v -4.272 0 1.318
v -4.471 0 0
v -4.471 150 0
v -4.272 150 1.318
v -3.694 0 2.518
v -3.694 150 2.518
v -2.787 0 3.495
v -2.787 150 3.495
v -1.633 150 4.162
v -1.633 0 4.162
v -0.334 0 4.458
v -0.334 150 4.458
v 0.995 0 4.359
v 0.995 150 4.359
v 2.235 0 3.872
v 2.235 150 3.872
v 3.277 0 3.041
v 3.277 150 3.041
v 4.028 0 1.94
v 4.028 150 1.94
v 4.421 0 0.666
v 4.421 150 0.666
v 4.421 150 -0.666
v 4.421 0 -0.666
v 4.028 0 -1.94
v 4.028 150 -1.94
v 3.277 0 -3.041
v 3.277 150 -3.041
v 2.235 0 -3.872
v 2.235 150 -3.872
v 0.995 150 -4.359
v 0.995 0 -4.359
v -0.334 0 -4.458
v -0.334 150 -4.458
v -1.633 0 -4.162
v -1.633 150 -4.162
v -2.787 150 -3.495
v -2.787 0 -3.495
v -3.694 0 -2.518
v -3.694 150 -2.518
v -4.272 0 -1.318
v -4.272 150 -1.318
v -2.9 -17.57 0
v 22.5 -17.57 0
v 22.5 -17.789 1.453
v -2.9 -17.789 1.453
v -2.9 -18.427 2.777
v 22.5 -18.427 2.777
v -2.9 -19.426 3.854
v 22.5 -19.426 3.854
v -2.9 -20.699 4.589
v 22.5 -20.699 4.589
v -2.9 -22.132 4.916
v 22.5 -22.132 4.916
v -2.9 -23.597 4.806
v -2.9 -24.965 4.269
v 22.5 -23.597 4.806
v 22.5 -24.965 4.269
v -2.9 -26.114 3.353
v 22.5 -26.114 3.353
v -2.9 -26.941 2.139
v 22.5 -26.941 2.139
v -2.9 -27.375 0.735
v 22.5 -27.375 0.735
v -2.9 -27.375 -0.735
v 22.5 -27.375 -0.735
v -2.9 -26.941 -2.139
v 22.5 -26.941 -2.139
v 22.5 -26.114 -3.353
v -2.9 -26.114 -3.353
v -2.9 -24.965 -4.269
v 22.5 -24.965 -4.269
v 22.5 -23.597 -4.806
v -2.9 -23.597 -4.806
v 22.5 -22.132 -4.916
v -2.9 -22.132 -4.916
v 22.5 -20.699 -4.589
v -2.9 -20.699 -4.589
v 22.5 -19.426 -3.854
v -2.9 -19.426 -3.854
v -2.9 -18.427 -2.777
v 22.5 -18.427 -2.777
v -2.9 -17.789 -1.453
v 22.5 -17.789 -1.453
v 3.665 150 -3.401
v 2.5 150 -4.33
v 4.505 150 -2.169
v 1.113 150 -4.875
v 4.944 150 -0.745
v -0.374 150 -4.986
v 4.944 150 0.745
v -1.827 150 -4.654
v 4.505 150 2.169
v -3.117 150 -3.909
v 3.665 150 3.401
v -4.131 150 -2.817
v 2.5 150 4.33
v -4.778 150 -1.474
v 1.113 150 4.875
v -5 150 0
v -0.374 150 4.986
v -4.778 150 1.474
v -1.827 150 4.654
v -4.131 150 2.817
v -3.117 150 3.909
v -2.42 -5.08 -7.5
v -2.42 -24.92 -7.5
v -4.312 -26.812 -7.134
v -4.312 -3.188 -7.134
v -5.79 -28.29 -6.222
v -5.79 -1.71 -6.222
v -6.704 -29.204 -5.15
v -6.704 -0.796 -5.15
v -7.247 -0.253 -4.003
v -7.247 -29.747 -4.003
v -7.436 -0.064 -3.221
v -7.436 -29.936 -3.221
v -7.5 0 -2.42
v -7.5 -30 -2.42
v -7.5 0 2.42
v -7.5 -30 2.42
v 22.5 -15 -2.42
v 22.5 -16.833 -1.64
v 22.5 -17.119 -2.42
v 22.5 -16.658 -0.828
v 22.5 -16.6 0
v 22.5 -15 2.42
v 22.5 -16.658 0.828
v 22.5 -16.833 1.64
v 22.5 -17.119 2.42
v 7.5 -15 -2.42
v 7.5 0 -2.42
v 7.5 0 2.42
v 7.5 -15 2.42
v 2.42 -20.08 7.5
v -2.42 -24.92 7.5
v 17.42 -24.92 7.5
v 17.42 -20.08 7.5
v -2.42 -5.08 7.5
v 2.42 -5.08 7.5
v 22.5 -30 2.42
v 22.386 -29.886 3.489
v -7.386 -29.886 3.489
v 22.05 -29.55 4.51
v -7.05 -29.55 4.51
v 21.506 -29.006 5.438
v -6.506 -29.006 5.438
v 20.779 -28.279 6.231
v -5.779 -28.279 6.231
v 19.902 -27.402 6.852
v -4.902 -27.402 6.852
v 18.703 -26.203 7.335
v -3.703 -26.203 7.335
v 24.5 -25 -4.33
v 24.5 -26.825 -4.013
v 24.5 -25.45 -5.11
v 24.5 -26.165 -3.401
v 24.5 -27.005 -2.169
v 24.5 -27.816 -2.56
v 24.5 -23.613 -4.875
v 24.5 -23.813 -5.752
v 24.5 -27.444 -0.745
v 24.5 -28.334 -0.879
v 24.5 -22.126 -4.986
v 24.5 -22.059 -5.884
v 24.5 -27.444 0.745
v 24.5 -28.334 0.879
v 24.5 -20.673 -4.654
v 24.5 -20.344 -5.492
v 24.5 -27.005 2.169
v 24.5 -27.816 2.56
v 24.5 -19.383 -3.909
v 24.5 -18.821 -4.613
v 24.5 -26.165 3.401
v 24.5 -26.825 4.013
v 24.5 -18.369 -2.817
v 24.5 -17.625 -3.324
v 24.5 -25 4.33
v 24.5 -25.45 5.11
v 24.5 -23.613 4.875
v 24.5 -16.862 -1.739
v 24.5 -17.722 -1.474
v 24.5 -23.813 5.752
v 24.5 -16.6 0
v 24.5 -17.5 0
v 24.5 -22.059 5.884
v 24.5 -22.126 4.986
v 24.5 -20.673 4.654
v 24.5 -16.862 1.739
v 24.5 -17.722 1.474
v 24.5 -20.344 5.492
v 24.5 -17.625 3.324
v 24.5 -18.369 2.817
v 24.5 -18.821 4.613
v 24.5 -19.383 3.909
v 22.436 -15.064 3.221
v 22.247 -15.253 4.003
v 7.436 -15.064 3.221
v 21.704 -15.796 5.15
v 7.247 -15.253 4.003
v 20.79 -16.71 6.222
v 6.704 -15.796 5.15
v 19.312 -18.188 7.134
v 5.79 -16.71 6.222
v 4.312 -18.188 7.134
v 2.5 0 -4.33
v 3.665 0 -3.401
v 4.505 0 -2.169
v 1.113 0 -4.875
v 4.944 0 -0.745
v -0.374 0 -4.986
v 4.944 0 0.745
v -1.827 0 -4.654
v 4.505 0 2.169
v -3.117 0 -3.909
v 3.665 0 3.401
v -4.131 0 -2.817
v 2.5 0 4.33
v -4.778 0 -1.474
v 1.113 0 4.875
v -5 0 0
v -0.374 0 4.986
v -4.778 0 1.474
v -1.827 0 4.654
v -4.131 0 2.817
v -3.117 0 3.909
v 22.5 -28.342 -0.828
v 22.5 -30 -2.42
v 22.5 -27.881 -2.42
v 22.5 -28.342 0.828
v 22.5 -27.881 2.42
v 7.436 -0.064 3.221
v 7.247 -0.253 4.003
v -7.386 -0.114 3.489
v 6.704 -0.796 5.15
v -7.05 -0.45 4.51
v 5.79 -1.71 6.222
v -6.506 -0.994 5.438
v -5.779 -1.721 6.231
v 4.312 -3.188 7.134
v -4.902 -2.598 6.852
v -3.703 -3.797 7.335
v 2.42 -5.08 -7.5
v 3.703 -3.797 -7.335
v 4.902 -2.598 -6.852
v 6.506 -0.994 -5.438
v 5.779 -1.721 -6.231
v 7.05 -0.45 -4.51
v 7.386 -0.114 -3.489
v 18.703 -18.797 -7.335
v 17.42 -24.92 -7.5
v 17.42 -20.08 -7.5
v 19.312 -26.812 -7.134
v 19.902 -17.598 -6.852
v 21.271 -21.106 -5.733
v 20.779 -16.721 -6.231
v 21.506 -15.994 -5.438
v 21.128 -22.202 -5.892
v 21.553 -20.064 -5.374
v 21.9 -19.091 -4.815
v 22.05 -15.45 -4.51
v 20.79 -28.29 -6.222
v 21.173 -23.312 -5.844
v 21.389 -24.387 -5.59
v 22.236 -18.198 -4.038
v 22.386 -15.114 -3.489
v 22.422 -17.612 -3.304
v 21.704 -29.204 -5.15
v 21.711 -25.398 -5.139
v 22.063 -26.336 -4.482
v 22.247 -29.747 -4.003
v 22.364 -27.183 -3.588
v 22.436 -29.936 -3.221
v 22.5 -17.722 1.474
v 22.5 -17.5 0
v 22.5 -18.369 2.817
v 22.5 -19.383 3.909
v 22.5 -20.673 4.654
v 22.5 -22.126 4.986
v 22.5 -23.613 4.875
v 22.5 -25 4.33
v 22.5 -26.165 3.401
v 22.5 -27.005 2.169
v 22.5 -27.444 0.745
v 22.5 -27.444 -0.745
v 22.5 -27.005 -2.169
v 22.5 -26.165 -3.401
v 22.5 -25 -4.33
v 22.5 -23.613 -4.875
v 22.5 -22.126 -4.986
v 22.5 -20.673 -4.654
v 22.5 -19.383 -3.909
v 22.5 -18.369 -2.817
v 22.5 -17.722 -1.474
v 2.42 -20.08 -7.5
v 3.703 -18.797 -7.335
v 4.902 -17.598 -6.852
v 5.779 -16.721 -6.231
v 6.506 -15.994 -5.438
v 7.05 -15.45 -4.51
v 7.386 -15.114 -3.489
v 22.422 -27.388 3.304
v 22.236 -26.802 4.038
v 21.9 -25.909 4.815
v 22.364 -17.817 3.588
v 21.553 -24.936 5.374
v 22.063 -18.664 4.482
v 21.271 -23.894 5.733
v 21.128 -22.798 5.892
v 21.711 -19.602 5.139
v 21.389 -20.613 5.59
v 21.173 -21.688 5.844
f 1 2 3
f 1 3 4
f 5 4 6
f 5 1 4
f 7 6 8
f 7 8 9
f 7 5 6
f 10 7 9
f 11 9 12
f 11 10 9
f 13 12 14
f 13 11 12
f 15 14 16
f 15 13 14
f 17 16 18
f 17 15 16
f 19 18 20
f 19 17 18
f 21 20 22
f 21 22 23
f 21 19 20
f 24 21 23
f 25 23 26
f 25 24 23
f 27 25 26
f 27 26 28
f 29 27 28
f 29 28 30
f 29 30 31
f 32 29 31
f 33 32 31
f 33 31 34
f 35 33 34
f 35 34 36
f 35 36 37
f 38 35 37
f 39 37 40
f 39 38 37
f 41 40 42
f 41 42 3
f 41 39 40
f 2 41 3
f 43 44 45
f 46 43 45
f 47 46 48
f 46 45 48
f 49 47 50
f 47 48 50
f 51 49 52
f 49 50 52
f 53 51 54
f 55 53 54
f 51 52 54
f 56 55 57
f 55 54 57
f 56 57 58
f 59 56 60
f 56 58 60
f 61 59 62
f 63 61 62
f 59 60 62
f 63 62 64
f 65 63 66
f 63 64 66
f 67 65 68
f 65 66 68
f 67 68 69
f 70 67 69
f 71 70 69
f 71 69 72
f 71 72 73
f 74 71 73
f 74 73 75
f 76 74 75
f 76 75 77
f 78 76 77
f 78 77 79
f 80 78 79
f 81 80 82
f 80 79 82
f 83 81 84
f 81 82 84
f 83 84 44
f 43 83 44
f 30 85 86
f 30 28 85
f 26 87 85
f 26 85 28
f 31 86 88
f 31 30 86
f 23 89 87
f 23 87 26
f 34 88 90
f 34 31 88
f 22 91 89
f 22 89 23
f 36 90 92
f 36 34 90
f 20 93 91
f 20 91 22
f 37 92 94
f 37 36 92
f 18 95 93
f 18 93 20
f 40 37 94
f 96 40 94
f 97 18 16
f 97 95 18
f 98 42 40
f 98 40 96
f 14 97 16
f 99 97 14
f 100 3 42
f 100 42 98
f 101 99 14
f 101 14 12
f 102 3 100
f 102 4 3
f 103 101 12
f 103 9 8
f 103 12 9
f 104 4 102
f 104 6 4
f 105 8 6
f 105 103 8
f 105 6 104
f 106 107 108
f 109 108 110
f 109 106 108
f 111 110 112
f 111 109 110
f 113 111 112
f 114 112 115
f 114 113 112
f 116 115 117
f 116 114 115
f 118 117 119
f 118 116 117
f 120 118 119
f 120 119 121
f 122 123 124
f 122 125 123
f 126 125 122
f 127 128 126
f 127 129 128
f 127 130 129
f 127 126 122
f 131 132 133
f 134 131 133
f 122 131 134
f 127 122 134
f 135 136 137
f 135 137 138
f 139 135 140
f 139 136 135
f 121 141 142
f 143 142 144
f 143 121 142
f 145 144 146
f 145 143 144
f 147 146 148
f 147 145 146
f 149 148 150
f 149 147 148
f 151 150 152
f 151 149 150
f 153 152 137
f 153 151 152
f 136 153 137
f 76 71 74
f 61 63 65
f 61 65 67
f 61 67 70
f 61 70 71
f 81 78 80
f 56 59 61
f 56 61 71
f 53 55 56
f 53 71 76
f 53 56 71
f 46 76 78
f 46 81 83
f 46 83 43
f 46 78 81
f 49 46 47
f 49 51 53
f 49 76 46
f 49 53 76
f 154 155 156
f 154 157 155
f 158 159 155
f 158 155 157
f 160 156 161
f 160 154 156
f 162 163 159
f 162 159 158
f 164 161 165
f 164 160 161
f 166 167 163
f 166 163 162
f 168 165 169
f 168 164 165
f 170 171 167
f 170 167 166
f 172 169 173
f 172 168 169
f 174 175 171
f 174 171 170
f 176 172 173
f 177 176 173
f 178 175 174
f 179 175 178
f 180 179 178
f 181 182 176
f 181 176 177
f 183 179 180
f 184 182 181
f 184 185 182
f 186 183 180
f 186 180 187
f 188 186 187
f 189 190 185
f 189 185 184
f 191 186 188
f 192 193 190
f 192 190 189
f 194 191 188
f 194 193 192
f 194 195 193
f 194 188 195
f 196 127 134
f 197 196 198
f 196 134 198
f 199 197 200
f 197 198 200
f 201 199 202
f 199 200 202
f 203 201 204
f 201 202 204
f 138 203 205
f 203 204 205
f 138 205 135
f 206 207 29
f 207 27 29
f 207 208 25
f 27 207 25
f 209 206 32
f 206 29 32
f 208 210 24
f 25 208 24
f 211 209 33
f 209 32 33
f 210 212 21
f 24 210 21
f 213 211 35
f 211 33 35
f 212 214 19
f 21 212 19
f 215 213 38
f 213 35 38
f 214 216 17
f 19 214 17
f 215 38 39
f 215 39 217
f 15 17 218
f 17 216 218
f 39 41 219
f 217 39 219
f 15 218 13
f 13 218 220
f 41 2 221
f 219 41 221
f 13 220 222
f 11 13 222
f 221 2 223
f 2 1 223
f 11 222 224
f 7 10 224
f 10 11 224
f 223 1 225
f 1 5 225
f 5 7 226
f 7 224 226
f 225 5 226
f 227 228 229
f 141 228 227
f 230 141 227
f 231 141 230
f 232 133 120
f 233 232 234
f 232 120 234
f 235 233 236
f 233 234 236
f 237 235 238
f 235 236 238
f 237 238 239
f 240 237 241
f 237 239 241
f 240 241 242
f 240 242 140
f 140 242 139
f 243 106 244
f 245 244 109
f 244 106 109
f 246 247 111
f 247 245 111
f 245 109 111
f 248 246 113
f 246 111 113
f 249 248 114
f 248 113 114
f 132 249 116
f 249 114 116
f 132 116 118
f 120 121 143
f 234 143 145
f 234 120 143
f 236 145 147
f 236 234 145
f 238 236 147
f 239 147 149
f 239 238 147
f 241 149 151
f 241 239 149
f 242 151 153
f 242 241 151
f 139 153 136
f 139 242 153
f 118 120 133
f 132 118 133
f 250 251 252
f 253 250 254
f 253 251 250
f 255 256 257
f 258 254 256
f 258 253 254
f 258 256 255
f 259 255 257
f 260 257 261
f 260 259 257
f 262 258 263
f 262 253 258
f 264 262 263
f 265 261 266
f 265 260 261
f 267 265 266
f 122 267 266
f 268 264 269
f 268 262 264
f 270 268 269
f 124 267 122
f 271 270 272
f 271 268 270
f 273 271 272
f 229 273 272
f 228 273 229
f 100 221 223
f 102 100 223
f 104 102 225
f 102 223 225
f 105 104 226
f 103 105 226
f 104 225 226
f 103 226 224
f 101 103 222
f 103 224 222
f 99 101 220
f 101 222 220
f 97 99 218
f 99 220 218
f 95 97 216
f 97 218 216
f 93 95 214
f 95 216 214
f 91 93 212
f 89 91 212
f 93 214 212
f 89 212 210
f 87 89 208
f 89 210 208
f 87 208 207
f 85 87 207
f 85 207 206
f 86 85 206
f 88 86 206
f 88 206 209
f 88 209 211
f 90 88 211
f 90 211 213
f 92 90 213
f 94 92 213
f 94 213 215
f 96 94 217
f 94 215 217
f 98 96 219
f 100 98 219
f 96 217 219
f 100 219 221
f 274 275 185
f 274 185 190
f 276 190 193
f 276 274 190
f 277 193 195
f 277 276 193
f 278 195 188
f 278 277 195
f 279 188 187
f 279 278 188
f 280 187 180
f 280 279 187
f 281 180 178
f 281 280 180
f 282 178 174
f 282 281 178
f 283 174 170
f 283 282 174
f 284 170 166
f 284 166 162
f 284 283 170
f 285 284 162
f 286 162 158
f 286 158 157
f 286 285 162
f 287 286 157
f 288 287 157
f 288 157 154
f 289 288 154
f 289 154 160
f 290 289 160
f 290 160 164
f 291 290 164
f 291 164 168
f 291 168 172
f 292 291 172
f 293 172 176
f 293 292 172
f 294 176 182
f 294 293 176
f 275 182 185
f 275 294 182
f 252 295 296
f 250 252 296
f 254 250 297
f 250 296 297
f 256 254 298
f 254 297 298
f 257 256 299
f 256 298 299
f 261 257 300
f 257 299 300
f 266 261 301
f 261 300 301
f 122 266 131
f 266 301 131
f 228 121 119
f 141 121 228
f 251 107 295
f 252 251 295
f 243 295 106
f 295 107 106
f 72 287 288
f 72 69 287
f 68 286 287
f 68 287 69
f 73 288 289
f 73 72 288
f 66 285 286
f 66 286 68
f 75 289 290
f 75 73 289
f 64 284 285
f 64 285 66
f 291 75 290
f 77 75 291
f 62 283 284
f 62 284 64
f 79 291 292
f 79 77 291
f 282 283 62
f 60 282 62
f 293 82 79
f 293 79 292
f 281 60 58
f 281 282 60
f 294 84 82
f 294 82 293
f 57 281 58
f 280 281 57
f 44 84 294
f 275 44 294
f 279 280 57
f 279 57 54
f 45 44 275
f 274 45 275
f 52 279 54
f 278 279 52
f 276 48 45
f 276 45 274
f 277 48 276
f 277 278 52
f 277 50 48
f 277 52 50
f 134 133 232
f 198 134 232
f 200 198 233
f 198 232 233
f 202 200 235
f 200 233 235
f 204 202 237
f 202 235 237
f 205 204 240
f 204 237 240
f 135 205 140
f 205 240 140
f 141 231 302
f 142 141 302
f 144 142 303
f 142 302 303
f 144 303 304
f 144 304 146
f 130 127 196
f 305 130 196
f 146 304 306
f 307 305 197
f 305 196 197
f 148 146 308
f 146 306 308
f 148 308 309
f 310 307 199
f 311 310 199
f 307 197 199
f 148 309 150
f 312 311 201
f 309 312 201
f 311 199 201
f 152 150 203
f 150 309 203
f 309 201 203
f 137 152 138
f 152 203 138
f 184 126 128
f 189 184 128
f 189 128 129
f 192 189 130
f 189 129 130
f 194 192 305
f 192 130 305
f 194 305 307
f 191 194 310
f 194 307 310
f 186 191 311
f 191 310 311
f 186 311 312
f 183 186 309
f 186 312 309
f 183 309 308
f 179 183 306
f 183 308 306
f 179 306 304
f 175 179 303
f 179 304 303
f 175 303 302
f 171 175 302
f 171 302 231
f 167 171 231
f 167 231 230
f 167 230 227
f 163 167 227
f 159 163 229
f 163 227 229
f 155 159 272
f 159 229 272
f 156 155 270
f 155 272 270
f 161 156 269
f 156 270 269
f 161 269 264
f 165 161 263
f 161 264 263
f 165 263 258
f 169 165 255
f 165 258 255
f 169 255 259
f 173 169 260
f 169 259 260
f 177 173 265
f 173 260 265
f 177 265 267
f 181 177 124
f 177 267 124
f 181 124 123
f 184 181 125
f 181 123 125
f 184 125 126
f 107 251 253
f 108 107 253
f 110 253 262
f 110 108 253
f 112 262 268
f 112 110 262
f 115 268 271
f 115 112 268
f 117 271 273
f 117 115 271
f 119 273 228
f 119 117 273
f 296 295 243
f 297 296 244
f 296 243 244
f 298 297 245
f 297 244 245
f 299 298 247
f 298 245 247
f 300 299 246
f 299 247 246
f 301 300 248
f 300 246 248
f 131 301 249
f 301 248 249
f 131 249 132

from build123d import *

# Parameters (mm, degrees)
F0_W          = 15
F0_H          = 15
F0_W_2        = 10
F0_H_2        = 10
F1_DEPTH      = 30
F2_W          = 15
F2_H          = 15
F2_W_2        = 10
F2_H_2        = 10
F4_DEPTH      = 15
F3_W          = 10
F3_H          = 10
F5_DEPTH      = 30
F6_R          = 5
F6_R_2        = 4.4707642424
F7_DEPTH      = 150
F8_W          = 10
F8_H          = 10
F9_DEPTH      = 15
F10_R         = 5.9
F10_R_2       = 5
F11_DEPTH     = 2
F12_R         = 4.929647133
F13_DEPTH     = 25.4
F14_T1_DEPTH  = 27.7
F14_T3_DEPTH  = 27.7
F14_T5_DEPTH  = 55.4
F14_T7_DEPTH  = 55.4
F14_T9_DEPTH  = 40.4
F14_T14_DEPTH = 40.4
F14_S15_R     = 5.9
F14_T16_DEPTH = 22
F14_T20_DEPTH = 40.4
F14_S21_R     = 5.9
F14_T22_DEPTH = 22
F14_T27_DEPTH = 27.7
F14_T31_DEPTH = 27.7
F14_S33_R     = 4.929647133
F14_T34_DEPTH = 16
F14_T40_DEPTH = 27.7
F14_T44_DEPTH = 27.7
F14_S46_R     = 4.929647133
F14_T47_DEPTH = 16


# Not quite as in the source:
# - a fillet or chamfer that OpenCascade refuses, or shapes differently, is made with other operations: its cross-section is extruded or revolved along the edge and cut away or added


with BuildPart() as f1:
    # F0 (on Front) → F1 (new body)
    with BuildSketch(Plane.XZ):
        Rectangle(F0_W, F0_H)
        Rectangle(F0_W_2, F0_H_2, mode=Mode.SUBTRACT)
    extrude(amount=F1_DEPTH)

    # F2 (on face) → F4 (join)
    with BuildSketch(Plane.YZ.offset(7.5)):
        with Locations((-22.5, 0)):
            Rectangle(F2_W, F2_H)
        with Locations((-22.5, 0)):
            Rectangle(F2_W_2, F2_H_2, mode=Mode.SUBTRACT)
    extrude(amount=F4_DEPTH)

    # F3 (on face) → F5 (join)
    with BuildSketch(Plane.XZ.offset(30)):
        Rectangle(F3_W, F3_H)
    extrude(amount=-F5_DEPTH)

    # F8 (on face) → F9 (join)
    with BuildSketch(Plane.YZ.offset(7.5)):
        with Locations((-22.5, 0)):
            Rectangle(F8_W, F8_H)
    extrude(amount=F9_DEPTH)

    # F10 (on face) → F11 (join)
    with BuildSketch(Plane.YZ.offset(22.5)):
        with Locations((-22.5, 0)):
            Circle(F10_R)
        with Locations((-22.5, 0)):
            Circle(F10_R_2, mode=Mode.SUBTRACT)
    extrude(amount=F11_DEPTH)

    # F12 (on face) → F13 (cut)
    with BuildSketch(Plane.YZ.offset(22.5)):
        with Locations((-22.5, 0)):
            Circle(F12_R)
    extrude(amount=-F13_DEPTH, mode=Mode.SUBTRACT)

    # F14: fillet of radius 5.08 on 12 edges, made by hand

    # F14_s2 → F14_t1 (cut)
    with BuildSketch(Plane.XZ.offset(-12.7)):
        with BuildLine():
            ThreePointArc((7.5, 2.42), (6.0121024484, 6.0121024484), (2.42, 7.5))
            Line((2.42, 7.5), (7.5, 7.5))
            Line((7.5, 7.5), (7.5, 2.42))
        make_face()
        with BuildLine():
            ThreePointArc((2.42, -7.5), (6.0121024484, -6.0121024484), (7.5, -2.42))
            Line((7.5, -2.42), (7.5, -7.5))
            Line((7.5, -7.5), (2.42, -7.5))
        make_face()
    extrude(amount=F14_T1_DEPTH, mode=Mode.SUBTRACT)

    # F14_s4 → F14_t3 (cut)
    with BuildSketch(Plane.YZ.offset(7.5)):
        with BuildLine():
            ThreePointArc((-15, 2.42), (-16.4878975516, 6.0121024484), (-20.08, 7.5))
            Line((-20.08, 7.5), (-15, 7.5))
            Line((-15, 7.5), (-15, 2.42))
        make_face()
        with BuildLine():
            ThreePointArc((-20.08, -7.5), (-16.4878975516, -6.0121024484), (-15, -2.42))
            Line((-15, -2.42), (-15, -7.5))
            Line((-15, -7.5), (-20.08, -7.5))
        make_face()
    extrude(amount=F14_T3_DEPTH, mode=Mode.SUBTRACT)

    # F14_s6 → F14_t5 (cut)
    with BuildSketch(Plane.YZ.offset(-20.2)):
        with BuildLine():
            ThreePointArc((-30, 2.42), (-28.5121024484, 6.0121024484), (-24.92, 7.5))
            Line((-24.92, 7.5), (-30, 7.5))
            Line((-30, 7.5), (-30, 2.42))
        make_face()
        with BuildLine():
            ThreePointArc((-24.92, -7.5), (-28.5121024484, -6.0121024484), (-30, -2.42))
            Line((-30, -2.42), (-30, -7.5))
            Line((-30, -7.5), (-24.92, -7.5))
        make_face()
    extrude(amount=F14_T5_DEPTH, mode=Mode.SUBTRACT)

    # F14_s8 → F14_t7 (cut)
    with BuildSketch(Plane.XZ.offset(-12.7)):
        with BuildLine():
            ThreePointArc((-7.5, 2.42), (-6.0121024484, 6.0121024484), (-2.42, 7.5))
            Line((-2.42, 7.5), (-7.5, 7.5))
            Line((-7.5, 7.5), (-7.5, 2.42))
        make_face()
        with BuildLine():
            ThreePointArc((-2.42, -7.5), (-6.0121024484, -6.0121024484), (-7.5, -2.42))
            Line((-7.5, -2.42), (-7.5, -7.5))
            Line((-7.5, -7.5), (-2.42, -7.5))
        make_face()
    extrude(amount=F14_T7_DEPTH, mode=Mode.SUBTRACT)

    # F14_s10 → F14_t9 (cut)
    with BuildSketch(Plane.YZ.offset(-20.2)):
        with BuildLine():
            ThreePointArc((0, 2.42), (-1.4878975516, 6.0121024484), (-5.08, 7.5))
            Line((-5.08, 7.5), (0, 7.5))
            Line((0, 7.5), (0, 2.42))
        make_face()
        with BuildLine():
            ThreePointArc((-5.08, -7.5), (-1.4878975516, -6.0121024484), (0, -2.42))
            Line((0, -2.42), (0, -7.5))
            Line((0, -7.5), (-5.08, -7.5))
        make_face()
    extrude(amount=F14_T9_DEPTH, mode=Mode.SUBTRACT)


with BuildPart() as f7:
    # F6 (on face) → F7 (new body)
    with BuildSketch(Plane(origin=(0, 0, 0), x_dir=(-1, 0, 0), z_dir=(0, 1, 0))):
        Circle(F6_R)
        Circle(F6_R_2, mode=Mode.SUBTRACT)
    extrude(amount=F7_DEPTH)


with BuildPart() as f14_tool12:
    # F14_s13 → F14_t14 (new body)
    with BuildSketch(Plane.XZ.offset(2.3)):
        with BuildLine():
            ThreePointArc((22.5, 2.42), (21.0121024484, 6.0121024484), (17.42, 7.5))
            Line((17.42, 7.5), (22.5, 7.5))
            Line((22.5, 7.5), (22.5, 2.42))
        make_face()
    extrude(amount=F14_T14_DEPTH)

    # F14_s15 → F14_t16 (cut, symmetric)
    with BuildSketch(Plane.YZ.offset(20)):
        with Locations((-22.5, 0)):
            Circle(F14_S15_R)
    extrude(amount=F14_T16_DEPTH, both=True, mode=Mode.SUBTRACT)


with BuildPart() as f1_1:
    add(f1.part)

    # F14_t11: cut F14_tool12
    add(f14_tool12.part, mode=Mode.SUBTRACT)


with BuildPart() as f14_tool18:
    # F14_s19 → F14_t20 (new body)
    with BuildSketch(Plane.XZ.offset(42.7)):
        with BuildLine():
            ThreePointArc((17.42, -7.5), (21.0121024484, -6.0121024484), (22.5, -2.42))
            Line((22.5, -2.42), (22.5, -7.5))
            Line((22.5, -7.5), (17.42, -7.5))
        make_face()
    extrude(amount=-F14_T20_DEPTH)

    # F14_s21 → F14_t22 (cut, symmetric)
    with BuildSketch(Plane.YZ.offset(20)):
        with Locations((-22.5, 0)):
            Circle(F14_S21_R)
    extrude(amount=F14_T22_DEPTH, both=True, mode=Mode.SUBTRACT)


with BuildPart() as f1_2:
    add(f1_1.part)

    # F14_t17: cut F14_tool18
    add(f14_tool18.part, mode=Mode.SUBTRACT)


with BuildPart() as f14_tool25:
    # F14_s26 → F14_t27 (new body)
    with BuildSketch(Plane.YZ.offset(-5.2)):
        with BuildLine():
            ThreePointArc((-15, 2.42), (-16.4878975516, 6.0121024484), (-20.08, 7.5))
            Line((-20.08, 7.5), (-15, 7.5))
            Line((-15, 7.5), (-15, 2.42))
        make_face()
    extrude(amount=F14_T27_DEPTH)

    split(bisect_by=Plane.YZ.offset(7.5), keep=Keep.BOTTOM)


with BuildPart() as f14_tool29:
    # F14_s30 → F14_t31 (new body)
    with BuildSketch(Plane.XZ):
        with BuildLine():
            ThreePointArc((7.5, 2.42), (6.0121024484, 6.0121024484), (2.42, 7.5))
            Line((2.42, 7.5), (7.5, 7.5))
            Line((7.5, 7.5), (7.5, 2.42))
        make_face()
    extrude(amount=F14_T31_DEPTH)

    split(bisect_by=Plane.XZ.offset(15), keep=Keep.TOP)

    # F14_s33 → F14_t34 (cut, symmetric)
    with BuildSketch(Plane.YZ.offset(5)):
        with Locations((-22.5, 0)):
            Circle(F14_S33_R)
    extrude(amount=F14_T34_DEPTH, both=True, mode=Mode.SUBTRACT)


with BuildPart() as f14_tool25_1:
    add(f14_tool25.part)

    # F14_t35: intersect F14_tool29
    add(f14_tool29.part, mode=Mode.INTERSECT)


with BuildPart() as f1_3:
    add(f1_2.part)

    # F14_t23: cut F14_tool25
    add(f14_tool25_1.part, mode=Mode.SUBTRACT)


with BuildPart() as f14_tool38:
    # F14_s39 → F14_t40 (new body)
    with BuildSketch(Plane.YZ.offset(-5.2)):
        with BuildLine():
            ThreePointArc((-20.08, -7.5), (-16.4878975516, -6.0121024484), (-15, -2.42))
            Line((-15, -2.42), (-15, -7.5))
            Line((-15, -7.5), (-20.08, -7.5))
        make_face()
    extrude(amount=F14_T40_DEPTH)

    split(bisect_by=Plane.YZ.offset(7.5), keep=Keep.BOTTOM)


with BuildPart() as f14_tool42:
    # F14_s43 → F14_t44 (new body)
    with BuildSketch(Plane.XZ):
        with BuildLine():
            ThreePointArc((2.42, -7.5), (6.0121024484, -6.0121024484), (7.5, -2.42))
            Line((7.5, -2.42), (7.5, -7.5))
            Line((7.5, -7.5), (2.42, -7.5))
        make_face()
    extrude(amount=F14_T44_DEPTH)

    split(bisect_by=Plane.XZ.offset(15), keep=Keep.TOP)

    # F14_s46 → F14_t47 (cut, symmetric)
    with BuildSketch(Plane.YZ.offset(5)):
        with Locations((-22.5, 0)):
            Circle(F14_S46_R)
    extrude(amount=F14_T47_DEPTH, both=True, mode=Mode.SUBTRACT)


with BuildPart() as f14_tool38_1:
    add(f14_tool38.part)

    # F14_t48: intersect F14_tool42
    add(f14_tool42.part, mode=Mode.INTERSECT)


with BuildPart() as f1_4:
    add(f1_3.part)

    # F14_t36: cut F14_tool38
    add(f14_tool38_1.part, mode=Mode.SUBTRACT)


solid = Compound([f7.part, f1_4.part])
